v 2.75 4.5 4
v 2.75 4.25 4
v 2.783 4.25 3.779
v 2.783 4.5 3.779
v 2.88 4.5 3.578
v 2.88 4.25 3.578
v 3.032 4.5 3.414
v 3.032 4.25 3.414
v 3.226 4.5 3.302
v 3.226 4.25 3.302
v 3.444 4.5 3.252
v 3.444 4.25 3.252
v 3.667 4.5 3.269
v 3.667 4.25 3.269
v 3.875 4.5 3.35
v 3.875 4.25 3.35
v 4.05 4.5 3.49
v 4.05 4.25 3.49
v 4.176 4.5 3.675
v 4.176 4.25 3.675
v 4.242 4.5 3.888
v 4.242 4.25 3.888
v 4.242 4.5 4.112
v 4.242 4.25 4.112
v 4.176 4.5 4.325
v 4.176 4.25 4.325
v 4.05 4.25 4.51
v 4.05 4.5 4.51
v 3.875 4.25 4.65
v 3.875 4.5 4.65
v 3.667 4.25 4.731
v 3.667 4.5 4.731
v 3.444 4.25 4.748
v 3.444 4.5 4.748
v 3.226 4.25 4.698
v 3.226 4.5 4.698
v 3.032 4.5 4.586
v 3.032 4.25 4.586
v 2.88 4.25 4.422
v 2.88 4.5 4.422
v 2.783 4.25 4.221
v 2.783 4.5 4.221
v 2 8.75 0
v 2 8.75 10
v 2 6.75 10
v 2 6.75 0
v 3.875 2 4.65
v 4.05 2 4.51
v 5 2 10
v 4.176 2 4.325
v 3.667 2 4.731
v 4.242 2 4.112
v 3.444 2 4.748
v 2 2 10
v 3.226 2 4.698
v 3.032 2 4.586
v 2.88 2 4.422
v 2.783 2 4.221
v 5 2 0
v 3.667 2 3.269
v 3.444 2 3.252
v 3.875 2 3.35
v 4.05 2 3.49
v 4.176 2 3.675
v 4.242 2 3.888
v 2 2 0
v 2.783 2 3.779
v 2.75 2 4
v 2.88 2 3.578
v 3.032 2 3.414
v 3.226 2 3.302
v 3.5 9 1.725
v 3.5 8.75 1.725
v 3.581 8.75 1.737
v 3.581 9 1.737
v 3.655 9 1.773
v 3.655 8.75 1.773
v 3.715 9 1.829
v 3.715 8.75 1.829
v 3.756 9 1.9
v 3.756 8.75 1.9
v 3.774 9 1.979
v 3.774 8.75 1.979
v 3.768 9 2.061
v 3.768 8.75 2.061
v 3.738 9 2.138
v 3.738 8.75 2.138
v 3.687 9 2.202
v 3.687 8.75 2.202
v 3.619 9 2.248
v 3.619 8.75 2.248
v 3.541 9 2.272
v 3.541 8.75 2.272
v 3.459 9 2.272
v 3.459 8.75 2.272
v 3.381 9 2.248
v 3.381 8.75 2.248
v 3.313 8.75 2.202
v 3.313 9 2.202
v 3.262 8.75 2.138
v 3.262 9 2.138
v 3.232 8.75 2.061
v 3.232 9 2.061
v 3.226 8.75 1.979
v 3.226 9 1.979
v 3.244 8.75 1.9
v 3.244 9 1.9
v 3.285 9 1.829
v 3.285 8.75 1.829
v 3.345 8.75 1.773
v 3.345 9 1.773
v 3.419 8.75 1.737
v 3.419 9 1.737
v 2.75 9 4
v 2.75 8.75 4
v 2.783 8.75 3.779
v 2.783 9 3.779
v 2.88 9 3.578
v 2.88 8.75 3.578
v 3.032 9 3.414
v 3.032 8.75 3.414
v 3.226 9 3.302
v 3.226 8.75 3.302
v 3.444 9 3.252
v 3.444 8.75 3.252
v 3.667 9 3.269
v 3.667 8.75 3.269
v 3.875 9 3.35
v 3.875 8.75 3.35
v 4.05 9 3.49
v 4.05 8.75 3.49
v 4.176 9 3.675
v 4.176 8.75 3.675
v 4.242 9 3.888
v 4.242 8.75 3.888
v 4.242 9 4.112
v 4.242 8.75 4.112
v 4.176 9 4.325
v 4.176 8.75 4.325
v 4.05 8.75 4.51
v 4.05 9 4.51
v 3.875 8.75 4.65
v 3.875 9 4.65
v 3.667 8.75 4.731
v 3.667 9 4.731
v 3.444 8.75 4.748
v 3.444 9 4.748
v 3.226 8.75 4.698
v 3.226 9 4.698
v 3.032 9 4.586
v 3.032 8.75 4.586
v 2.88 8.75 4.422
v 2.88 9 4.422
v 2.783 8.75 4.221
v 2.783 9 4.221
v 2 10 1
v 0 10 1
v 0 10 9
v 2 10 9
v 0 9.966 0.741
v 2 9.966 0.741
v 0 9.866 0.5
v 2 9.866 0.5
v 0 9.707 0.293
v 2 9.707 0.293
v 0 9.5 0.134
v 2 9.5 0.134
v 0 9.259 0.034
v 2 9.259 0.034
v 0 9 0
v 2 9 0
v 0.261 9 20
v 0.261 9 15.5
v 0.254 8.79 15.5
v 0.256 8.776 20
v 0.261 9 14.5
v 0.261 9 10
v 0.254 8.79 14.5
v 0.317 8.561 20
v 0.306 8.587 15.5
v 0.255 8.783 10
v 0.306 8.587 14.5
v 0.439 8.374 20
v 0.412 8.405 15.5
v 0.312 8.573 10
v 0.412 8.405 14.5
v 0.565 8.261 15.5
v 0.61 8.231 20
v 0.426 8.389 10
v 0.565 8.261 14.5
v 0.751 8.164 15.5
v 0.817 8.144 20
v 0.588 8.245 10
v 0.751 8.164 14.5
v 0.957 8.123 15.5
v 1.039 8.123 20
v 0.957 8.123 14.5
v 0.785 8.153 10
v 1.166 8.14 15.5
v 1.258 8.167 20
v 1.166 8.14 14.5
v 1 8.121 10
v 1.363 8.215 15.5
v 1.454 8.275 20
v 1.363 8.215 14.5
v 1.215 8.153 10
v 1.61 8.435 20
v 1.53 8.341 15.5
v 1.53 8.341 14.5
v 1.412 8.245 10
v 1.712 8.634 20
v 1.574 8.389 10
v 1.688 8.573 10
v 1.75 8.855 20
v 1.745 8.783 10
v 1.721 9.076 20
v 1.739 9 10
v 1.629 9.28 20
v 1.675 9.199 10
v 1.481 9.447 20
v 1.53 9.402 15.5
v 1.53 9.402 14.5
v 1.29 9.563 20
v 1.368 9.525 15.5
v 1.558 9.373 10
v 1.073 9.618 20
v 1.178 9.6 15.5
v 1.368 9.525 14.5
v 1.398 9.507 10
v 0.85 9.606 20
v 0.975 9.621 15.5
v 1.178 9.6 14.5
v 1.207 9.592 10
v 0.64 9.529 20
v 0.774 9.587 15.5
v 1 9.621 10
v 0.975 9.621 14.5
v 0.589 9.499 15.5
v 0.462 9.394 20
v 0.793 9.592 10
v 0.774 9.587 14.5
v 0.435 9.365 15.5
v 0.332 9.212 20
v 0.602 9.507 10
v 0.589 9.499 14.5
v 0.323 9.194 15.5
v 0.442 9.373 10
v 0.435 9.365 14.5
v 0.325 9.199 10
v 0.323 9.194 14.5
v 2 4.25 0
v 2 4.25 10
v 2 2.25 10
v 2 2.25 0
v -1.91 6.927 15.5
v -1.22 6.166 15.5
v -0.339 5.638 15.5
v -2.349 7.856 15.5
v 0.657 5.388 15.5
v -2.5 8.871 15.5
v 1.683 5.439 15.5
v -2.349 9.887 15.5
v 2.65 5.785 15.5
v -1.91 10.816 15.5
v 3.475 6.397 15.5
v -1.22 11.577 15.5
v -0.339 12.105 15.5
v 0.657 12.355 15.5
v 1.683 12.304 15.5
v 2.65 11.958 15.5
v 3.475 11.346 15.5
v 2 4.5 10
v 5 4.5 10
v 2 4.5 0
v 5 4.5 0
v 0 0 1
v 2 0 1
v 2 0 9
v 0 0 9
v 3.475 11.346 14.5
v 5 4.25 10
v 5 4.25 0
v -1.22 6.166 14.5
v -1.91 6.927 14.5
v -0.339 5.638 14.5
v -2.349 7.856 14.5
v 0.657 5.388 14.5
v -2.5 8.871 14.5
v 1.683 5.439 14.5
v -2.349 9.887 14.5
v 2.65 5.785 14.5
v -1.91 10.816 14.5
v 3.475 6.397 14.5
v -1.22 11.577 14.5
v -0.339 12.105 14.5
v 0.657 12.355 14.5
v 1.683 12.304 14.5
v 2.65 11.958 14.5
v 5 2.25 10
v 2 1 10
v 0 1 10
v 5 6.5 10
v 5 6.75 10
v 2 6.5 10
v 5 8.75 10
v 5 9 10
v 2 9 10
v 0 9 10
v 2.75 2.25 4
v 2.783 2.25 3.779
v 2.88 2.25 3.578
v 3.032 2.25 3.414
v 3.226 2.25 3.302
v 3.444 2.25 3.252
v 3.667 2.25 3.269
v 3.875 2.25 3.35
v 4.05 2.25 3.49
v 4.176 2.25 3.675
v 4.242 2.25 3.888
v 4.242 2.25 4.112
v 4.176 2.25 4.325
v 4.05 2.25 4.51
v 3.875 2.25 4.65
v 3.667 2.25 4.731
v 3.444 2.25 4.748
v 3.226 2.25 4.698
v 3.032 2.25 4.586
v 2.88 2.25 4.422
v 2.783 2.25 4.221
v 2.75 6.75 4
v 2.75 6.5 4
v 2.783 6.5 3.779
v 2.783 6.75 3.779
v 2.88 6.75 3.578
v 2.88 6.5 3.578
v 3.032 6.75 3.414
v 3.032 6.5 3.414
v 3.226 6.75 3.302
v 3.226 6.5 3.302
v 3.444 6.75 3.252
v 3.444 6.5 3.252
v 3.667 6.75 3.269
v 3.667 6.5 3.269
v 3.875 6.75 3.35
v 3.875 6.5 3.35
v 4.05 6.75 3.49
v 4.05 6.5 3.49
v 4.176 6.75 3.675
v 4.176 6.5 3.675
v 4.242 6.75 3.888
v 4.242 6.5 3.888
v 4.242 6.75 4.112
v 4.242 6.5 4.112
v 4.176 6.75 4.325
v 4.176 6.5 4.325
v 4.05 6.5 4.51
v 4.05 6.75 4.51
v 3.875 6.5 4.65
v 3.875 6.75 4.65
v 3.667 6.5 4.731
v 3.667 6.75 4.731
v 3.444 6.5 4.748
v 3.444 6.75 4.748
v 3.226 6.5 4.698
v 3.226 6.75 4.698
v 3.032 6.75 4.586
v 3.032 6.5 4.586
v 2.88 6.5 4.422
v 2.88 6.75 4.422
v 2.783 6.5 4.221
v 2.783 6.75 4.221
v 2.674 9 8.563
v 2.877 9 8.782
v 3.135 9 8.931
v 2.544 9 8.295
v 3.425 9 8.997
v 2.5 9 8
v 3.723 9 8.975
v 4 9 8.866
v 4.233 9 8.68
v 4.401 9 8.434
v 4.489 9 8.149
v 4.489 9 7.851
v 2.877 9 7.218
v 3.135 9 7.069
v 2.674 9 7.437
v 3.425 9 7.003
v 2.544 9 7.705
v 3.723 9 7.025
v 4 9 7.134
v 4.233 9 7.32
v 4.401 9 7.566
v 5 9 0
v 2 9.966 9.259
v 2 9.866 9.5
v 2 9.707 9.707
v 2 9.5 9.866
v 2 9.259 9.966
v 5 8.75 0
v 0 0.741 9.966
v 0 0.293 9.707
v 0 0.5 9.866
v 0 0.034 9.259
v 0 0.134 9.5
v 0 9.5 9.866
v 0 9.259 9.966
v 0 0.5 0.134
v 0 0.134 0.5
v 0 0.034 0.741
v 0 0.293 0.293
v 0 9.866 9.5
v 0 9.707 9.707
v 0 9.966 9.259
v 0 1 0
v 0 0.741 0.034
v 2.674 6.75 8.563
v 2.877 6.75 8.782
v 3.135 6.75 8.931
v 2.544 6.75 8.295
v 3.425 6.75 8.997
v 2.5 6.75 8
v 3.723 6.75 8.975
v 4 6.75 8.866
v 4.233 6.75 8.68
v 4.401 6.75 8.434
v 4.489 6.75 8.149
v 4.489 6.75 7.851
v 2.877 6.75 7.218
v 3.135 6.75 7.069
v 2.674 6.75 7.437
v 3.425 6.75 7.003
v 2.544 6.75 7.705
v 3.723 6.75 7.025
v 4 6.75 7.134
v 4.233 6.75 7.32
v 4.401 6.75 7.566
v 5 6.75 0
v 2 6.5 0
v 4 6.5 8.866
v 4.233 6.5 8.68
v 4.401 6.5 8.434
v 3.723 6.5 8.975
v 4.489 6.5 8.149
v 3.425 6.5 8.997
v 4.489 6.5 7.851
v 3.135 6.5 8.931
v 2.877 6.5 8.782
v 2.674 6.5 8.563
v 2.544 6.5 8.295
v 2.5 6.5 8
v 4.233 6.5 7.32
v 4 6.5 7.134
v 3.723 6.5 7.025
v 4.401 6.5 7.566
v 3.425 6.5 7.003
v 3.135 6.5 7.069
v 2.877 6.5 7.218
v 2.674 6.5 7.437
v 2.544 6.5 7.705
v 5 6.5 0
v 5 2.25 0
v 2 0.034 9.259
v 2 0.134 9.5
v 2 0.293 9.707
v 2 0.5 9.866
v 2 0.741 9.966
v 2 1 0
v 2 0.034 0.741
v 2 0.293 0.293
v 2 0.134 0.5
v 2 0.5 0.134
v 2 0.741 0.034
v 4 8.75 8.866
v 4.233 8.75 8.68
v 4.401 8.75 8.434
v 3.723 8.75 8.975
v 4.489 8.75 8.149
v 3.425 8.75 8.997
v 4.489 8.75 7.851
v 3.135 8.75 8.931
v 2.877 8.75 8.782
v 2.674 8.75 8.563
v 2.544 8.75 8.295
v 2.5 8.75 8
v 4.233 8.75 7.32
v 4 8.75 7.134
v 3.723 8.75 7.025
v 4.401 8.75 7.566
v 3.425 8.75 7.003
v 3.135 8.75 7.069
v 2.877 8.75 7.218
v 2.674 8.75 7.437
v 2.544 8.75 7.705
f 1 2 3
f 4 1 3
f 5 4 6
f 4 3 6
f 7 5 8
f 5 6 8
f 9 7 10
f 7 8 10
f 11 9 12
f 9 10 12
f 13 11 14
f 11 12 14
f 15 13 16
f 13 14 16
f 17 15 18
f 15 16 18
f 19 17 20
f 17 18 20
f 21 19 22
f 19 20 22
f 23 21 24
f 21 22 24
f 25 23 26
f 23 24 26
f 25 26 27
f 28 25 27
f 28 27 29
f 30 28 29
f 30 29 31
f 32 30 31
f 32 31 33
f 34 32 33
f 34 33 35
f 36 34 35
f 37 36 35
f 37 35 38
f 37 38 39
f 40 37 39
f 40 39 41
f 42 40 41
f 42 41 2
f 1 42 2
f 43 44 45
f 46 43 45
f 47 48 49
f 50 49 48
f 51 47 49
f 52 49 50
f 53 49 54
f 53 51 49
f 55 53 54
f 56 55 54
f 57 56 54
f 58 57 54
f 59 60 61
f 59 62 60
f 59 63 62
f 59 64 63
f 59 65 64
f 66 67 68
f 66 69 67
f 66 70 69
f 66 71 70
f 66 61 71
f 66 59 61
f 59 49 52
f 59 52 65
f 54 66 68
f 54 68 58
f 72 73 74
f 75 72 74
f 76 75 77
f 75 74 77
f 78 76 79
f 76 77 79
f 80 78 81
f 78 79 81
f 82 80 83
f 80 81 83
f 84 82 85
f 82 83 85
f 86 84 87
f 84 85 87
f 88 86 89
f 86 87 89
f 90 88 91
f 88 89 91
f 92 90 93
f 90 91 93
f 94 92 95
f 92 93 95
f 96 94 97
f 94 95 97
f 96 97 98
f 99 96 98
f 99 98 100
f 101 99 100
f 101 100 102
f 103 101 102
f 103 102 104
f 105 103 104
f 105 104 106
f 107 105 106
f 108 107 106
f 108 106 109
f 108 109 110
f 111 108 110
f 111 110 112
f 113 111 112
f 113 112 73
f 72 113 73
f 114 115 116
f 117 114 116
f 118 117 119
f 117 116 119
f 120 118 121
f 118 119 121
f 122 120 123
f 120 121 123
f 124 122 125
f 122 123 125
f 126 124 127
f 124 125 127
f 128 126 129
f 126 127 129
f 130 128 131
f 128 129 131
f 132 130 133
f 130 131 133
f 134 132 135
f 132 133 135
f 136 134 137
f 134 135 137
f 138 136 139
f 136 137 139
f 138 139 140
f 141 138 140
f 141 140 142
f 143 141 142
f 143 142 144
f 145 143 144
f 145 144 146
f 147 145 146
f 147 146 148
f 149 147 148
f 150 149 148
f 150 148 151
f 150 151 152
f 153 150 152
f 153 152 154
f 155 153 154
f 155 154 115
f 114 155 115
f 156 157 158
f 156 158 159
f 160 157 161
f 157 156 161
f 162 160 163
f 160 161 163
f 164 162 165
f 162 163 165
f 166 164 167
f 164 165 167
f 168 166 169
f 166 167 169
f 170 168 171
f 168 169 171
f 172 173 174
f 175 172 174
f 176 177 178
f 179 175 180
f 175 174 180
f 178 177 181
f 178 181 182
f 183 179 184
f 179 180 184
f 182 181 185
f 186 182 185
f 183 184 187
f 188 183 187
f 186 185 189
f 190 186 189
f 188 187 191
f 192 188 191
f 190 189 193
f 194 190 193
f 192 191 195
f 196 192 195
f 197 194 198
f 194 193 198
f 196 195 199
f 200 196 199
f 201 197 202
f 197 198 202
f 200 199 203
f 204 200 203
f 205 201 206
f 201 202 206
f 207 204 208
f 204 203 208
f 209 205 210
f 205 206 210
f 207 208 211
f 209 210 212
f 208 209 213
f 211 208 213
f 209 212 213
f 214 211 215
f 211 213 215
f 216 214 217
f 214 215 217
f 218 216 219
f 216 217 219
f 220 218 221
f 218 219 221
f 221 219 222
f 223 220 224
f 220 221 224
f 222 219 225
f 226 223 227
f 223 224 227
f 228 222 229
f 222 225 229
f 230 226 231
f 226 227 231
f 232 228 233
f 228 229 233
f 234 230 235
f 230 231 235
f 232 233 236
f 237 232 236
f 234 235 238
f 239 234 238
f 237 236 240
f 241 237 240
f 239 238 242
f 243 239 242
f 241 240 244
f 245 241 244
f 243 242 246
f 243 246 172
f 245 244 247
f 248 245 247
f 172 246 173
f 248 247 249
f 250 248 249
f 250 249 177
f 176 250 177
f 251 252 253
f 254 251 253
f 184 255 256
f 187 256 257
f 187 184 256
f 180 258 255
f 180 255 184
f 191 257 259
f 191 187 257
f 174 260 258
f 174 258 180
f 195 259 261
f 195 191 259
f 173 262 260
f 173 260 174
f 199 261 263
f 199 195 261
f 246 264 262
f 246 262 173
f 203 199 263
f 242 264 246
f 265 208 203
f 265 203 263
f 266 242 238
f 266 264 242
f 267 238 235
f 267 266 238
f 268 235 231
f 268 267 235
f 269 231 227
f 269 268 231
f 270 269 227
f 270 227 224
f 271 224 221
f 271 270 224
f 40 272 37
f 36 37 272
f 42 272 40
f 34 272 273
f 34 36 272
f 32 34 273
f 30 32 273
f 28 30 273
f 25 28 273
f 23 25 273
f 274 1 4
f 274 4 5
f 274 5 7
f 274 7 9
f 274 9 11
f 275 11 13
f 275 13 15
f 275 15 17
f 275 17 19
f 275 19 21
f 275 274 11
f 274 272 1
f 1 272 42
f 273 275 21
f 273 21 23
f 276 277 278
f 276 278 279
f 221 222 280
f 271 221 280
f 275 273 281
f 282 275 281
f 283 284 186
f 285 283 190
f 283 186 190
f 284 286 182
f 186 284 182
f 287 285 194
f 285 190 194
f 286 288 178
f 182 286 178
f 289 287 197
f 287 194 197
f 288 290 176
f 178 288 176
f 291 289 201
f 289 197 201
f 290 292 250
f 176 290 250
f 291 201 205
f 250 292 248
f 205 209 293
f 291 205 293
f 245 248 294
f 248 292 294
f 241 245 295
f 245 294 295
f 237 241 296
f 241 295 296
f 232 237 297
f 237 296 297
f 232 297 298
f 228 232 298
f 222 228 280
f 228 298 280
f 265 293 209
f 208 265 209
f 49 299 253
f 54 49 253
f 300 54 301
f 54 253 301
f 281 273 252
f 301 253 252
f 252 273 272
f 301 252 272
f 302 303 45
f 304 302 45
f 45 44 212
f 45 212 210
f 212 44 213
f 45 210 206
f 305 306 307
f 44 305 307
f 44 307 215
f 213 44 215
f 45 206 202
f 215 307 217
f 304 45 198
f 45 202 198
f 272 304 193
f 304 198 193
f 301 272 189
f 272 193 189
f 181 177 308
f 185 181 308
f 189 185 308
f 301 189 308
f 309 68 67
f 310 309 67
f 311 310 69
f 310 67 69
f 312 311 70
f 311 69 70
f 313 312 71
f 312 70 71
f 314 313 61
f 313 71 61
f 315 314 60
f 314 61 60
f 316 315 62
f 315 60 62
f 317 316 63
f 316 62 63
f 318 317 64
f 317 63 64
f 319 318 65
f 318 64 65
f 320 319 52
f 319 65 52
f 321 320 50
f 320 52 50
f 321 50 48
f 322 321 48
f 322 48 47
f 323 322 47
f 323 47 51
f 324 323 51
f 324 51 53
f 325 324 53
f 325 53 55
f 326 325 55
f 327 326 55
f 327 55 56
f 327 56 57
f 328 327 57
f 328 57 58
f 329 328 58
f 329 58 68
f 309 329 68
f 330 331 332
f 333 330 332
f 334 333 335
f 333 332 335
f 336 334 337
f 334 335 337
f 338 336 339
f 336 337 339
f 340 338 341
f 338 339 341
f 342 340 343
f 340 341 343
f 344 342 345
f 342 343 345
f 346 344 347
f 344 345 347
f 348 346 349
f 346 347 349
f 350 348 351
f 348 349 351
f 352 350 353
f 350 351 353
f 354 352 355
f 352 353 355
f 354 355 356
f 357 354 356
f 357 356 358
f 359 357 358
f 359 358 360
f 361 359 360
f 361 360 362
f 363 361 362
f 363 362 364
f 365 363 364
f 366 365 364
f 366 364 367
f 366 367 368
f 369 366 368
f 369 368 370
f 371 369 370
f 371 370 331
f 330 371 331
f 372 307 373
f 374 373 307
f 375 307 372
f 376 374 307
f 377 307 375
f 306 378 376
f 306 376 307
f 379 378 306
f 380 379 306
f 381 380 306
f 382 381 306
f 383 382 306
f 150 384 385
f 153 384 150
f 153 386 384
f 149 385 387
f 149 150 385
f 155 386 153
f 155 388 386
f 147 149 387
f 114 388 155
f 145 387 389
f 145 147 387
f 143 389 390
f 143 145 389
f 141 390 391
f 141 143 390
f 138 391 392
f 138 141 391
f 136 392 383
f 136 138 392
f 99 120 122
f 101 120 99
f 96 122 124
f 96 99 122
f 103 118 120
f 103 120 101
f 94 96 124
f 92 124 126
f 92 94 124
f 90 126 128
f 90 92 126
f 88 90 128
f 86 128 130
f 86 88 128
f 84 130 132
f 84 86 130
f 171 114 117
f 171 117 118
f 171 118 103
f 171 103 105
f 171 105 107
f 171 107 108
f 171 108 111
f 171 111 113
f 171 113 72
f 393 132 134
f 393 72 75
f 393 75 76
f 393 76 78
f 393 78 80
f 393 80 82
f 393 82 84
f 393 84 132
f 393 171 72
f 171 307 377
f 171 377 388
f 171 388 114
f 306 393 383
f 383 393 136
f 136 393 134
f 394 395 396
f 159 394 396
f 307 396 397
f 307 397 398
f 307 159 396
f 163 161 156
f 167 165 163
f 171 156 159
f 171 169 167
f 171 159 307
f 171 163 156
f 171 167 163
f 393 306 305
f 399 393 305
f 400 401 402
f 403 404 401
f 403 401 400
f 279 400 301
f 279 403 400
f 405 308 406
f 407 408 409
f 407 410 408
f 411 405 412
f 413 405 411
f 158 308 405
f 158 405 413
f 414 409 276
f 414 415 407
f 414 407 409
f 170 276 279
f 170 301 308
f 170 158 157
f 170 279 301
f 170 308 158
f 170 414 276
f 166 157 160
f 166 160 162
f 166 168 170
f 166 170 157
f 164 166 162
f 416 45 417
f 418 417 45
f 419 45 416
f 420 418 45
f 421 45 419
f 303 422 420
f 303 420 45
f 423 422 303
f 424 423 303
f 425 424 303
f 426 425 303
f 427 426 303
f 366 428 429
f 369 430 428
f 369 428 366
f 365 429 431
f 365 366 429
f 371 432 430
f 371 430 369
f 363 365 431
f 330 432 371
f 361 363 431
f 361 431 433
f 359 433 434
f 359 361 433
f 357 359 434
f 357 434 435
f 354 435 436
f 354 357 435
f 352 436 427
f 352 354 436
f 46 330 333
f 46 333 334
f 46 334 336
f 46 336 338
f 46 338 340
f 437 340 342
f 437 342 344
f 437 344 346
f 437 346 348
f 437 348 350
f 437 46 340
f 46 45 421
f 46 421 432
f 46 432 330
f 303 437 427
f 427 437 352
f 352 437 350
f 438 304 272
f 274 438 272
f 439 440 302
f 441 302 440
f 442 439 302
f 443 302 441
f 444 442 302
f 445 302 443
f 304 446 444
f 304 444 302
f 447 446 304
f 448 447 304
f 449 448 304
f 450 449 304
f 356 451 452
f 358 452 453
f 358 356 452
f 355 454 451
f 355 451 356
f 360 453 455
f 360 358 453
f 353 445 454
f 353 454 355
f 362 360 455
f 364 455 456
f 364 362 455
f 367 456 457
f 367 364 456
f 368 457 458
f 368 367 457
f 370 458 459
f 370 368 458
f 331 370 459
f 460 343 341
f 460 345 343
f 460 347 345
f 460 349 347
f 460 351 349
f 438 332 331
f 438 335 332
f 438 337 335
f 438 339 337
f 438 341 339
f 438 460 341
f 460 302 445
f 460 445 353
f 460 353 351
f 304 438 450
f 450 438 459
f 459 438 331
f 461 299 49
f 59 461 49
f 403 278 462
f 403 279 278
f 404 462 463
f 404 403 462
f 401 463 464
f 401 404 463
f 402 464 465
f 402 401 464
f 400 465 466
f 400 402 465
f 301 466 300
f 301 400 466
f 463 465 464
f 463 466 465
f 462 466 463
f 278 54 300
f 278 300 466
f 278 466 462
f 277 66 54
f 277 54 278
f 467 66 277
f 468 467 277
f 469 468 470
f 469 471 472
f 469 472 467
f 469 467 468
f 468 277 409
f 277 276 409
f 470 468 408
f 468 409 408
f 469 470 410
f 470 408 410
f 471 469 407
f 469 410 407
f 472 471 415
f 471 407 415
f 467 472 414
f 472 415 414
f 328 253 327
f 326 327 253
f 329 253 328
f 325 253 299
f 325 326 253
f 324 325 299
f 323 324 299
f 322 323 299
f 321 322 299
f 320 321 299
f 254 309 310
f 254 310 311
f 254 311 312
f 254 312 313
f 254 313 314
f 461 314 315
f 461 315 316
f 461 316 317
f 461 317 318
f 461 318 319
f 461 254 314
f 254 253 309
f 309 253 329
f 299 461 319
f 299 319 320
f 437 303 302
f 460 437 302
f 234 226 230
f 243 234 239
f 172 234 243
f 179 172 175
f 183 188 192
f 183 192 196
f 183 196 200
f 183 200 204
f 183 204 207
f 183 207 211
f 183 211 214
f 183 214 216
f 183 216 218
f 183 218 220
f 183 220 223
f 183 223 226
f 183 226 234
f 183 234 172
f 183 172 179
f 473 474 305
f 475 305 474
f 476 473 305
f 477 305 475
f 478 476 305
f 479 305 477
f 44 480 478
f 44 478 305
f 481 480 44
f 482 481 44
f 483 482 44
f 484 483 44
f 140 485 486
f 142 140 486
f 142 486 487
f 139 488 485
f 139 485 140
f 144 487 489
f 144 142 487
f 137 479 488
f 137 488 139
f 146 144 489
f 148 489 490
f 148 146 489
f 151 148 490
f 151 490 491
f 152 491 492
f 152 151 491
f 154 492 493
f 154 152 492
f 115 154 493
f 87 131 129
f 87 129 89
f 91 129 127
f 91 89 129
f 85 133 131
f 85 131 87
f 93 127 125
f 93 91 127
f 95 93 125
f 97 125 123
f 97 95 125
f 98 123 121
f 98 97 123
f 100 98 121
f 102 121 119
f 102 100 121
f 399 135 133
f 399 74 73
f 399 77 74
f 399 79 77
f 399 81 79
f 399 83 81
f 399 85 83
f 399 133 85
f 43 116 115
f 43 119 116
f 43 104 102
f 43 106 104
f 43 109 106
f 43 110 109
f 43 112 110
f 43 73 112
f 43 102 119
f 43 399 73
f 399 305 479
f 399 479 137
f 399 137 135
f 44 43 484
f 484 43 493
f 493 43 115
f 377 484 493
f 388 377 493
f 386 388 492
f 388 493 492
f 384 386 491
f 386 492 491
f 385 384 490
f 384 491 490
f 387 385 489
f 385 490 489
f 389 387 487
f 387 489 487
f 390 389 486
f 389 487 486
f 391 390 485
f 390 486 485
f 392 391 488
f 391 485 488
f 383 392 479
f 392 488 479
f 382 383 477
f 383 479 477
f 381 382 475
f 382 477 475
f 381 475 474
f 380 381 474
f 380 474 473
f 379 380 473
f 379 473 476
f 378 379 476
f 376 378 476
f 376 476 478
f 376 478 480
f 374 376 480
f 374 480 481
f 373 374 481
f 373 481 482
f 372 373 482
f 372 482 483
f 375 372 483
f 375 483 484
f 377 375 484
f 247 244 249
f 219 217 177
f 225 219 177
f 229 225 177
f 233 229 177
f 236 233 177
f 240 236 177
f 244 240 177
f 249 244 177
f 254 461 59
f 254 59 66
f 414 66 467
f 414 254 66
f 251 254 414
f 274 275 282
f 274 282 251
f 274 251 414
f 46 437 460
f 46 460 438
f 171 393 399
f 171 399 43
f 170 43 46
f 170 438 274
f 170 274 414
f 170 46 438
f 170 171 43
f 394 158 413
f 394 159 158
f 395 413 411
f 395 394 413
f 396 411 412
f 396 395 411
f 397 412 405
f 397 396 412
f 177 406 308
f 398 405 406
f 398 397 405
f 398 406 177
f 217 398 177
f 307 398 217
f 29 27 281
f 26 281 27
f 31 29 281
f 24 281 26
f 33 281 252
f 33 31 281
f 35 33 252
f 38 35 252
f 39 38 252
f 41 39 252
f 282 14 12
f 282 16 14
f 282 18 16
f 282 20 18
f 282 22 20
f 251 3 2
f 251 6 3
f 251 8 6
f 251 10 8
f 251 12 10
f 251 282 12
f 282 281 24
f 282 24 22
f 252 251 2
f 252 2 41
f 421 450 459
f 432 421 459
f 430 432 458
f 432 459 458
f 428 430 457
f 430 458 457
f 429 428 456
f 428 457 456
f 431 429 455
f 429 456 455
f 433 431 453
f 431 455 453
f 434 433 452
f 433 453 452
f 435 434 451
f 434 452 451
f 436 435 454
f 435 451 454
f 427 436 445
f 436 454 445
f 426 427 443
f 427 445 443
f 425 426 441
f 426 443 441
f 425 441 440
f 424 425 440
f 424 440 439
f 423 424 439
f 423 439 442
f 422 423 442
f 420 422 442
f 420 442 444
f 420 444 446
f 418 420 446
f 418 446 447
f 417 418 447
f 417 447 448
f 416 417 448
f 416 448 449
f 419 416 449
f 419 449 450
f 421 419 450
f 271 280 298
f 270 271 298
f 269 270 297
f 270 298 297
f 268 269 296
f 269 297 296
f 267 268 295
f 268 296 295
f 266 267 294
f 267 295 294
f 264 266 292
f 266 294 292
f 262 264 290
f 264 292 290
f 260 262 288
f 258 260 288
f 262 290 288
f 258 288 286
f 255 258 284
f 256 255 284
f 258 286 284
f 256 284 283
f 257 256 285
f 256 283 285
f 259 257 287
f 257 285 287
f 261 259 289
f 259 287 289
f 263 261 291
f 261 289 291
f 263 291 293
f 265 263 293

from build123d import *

# Parameters (mm, degrees)
BOSS_EXTRUDE1_DEPTH              = 10
FILLET1_R                        = 1
SKETCH2_R                        = 0.75
BOSS_EXTRUDE2_DEPTH              = 10
BOSS_EXTRUDE3_DEPTH              = 1
F_0_55_0_55_DIAMETER_HOLE1_D     = 0.55
F_0_55_0_55_DIAMETER_HOLE1_DEPTH = 0.25
F_1_5_1_5_DIAMETER_HOLE1_D       = 1.5
F_2_0MM_DOWEL_HOLE1_D            = 2
F_2_0MM_DOWEL_HOLE1_DEPTH        = 4.499


with BuildPart() as part:
    # Sketch1 → Boss-Extrude1 (new body)
    with BuildSketch(Plane.XY):
        Polygon((0, 0), (0, 10), (2, 10), (2, 9), (5, 9), (5, 8.75), (2, 8.75), (2, 6.75), (5, 6.75), (5, 6.5), (2, 6.5), (2, 4.5), (5, 4.5), (5, 4.25), (2, 4.25), (2, 2.25), (5, 2.25), (5, 2), (2, 2), (2, 0), align=None)
    extrude(amount=BOSS_EXTRUDE1_DEPTH)

    # Fillet1
    fillet1_edges = [part.edges().sort_by_distance(p)[0] for p in [
        (1, 10, 0),
        (1, 0, 0),
        (1, 0, 10),
        (1, 10, 10),
    ]]
    fillet(fillet1_edges, radius=FILLET1_R)

    # Sketch2 → Boss-Extrude2 (add)
    with BuildSketch(Plane.XY.offset(10)):
        with Locations(Location((1, 8.871498734, 0), (0, 0, 170.134550894))):
            Circle(SKETCH2_R)
    extrude(amount=BOSS_EXTRUDE2_DEPTH)

    # Sketch3 → Boss-Extrude3 (add)
    with BuildSketch(Plane.XY.offset(14.5)):
        with BuildLine():
            Line((1, 8.871498734), (3.474873734, 11.346372468))
            ThreePointArc((3.474873734, 11.346372468), (-2.5, 8.871498734), (3.474873734, 6.396625))
            Line((3.474873734, 6.396625), (1, 8.871498734))
        make_face()
    extrude(amount=BOSS_EXTRUDE3_DEPTH)

    # Ø0.55 (0.55) Diameter Hole1
    with Locations(Plane(origin=(3.5, 9, 2), x_dir=(0, 0, 1), z_dir=(0, 1, 0))):
        with Locations((0, 0)):
            Hole(F_0_55_0_55_DIAMETER_HOLE1_D / 2, depth=F_0_55_0_55_DIAMETER_HOLE1_DEPTH)

    # Ø1.5 (1.5) Diameter Hole1 (through all)
    with Locations(Plane(origin=(0, 9, 0), x_dir=(1, 0, 0), z_dir=(0, 1, 0))):
        with Locations((3.5, -4)):
            Hole(F_1_5_1_5_DIAMETER_HOLE1_D / 2)

    # Ø2.0mm Dowel Hole1
    with Locations(Plane(origin=(0, 9, 0), x_dir=(1, 0, 0), z_dir=(0, 1, 0))):
        with Locations((3.5, -8)):
            Hole(F_2_0MM_DOWEL_HOLE1_D / 2, depth=F_2_0MM_DOWEL_HOLE1_DEPTH)


solid = part.part
